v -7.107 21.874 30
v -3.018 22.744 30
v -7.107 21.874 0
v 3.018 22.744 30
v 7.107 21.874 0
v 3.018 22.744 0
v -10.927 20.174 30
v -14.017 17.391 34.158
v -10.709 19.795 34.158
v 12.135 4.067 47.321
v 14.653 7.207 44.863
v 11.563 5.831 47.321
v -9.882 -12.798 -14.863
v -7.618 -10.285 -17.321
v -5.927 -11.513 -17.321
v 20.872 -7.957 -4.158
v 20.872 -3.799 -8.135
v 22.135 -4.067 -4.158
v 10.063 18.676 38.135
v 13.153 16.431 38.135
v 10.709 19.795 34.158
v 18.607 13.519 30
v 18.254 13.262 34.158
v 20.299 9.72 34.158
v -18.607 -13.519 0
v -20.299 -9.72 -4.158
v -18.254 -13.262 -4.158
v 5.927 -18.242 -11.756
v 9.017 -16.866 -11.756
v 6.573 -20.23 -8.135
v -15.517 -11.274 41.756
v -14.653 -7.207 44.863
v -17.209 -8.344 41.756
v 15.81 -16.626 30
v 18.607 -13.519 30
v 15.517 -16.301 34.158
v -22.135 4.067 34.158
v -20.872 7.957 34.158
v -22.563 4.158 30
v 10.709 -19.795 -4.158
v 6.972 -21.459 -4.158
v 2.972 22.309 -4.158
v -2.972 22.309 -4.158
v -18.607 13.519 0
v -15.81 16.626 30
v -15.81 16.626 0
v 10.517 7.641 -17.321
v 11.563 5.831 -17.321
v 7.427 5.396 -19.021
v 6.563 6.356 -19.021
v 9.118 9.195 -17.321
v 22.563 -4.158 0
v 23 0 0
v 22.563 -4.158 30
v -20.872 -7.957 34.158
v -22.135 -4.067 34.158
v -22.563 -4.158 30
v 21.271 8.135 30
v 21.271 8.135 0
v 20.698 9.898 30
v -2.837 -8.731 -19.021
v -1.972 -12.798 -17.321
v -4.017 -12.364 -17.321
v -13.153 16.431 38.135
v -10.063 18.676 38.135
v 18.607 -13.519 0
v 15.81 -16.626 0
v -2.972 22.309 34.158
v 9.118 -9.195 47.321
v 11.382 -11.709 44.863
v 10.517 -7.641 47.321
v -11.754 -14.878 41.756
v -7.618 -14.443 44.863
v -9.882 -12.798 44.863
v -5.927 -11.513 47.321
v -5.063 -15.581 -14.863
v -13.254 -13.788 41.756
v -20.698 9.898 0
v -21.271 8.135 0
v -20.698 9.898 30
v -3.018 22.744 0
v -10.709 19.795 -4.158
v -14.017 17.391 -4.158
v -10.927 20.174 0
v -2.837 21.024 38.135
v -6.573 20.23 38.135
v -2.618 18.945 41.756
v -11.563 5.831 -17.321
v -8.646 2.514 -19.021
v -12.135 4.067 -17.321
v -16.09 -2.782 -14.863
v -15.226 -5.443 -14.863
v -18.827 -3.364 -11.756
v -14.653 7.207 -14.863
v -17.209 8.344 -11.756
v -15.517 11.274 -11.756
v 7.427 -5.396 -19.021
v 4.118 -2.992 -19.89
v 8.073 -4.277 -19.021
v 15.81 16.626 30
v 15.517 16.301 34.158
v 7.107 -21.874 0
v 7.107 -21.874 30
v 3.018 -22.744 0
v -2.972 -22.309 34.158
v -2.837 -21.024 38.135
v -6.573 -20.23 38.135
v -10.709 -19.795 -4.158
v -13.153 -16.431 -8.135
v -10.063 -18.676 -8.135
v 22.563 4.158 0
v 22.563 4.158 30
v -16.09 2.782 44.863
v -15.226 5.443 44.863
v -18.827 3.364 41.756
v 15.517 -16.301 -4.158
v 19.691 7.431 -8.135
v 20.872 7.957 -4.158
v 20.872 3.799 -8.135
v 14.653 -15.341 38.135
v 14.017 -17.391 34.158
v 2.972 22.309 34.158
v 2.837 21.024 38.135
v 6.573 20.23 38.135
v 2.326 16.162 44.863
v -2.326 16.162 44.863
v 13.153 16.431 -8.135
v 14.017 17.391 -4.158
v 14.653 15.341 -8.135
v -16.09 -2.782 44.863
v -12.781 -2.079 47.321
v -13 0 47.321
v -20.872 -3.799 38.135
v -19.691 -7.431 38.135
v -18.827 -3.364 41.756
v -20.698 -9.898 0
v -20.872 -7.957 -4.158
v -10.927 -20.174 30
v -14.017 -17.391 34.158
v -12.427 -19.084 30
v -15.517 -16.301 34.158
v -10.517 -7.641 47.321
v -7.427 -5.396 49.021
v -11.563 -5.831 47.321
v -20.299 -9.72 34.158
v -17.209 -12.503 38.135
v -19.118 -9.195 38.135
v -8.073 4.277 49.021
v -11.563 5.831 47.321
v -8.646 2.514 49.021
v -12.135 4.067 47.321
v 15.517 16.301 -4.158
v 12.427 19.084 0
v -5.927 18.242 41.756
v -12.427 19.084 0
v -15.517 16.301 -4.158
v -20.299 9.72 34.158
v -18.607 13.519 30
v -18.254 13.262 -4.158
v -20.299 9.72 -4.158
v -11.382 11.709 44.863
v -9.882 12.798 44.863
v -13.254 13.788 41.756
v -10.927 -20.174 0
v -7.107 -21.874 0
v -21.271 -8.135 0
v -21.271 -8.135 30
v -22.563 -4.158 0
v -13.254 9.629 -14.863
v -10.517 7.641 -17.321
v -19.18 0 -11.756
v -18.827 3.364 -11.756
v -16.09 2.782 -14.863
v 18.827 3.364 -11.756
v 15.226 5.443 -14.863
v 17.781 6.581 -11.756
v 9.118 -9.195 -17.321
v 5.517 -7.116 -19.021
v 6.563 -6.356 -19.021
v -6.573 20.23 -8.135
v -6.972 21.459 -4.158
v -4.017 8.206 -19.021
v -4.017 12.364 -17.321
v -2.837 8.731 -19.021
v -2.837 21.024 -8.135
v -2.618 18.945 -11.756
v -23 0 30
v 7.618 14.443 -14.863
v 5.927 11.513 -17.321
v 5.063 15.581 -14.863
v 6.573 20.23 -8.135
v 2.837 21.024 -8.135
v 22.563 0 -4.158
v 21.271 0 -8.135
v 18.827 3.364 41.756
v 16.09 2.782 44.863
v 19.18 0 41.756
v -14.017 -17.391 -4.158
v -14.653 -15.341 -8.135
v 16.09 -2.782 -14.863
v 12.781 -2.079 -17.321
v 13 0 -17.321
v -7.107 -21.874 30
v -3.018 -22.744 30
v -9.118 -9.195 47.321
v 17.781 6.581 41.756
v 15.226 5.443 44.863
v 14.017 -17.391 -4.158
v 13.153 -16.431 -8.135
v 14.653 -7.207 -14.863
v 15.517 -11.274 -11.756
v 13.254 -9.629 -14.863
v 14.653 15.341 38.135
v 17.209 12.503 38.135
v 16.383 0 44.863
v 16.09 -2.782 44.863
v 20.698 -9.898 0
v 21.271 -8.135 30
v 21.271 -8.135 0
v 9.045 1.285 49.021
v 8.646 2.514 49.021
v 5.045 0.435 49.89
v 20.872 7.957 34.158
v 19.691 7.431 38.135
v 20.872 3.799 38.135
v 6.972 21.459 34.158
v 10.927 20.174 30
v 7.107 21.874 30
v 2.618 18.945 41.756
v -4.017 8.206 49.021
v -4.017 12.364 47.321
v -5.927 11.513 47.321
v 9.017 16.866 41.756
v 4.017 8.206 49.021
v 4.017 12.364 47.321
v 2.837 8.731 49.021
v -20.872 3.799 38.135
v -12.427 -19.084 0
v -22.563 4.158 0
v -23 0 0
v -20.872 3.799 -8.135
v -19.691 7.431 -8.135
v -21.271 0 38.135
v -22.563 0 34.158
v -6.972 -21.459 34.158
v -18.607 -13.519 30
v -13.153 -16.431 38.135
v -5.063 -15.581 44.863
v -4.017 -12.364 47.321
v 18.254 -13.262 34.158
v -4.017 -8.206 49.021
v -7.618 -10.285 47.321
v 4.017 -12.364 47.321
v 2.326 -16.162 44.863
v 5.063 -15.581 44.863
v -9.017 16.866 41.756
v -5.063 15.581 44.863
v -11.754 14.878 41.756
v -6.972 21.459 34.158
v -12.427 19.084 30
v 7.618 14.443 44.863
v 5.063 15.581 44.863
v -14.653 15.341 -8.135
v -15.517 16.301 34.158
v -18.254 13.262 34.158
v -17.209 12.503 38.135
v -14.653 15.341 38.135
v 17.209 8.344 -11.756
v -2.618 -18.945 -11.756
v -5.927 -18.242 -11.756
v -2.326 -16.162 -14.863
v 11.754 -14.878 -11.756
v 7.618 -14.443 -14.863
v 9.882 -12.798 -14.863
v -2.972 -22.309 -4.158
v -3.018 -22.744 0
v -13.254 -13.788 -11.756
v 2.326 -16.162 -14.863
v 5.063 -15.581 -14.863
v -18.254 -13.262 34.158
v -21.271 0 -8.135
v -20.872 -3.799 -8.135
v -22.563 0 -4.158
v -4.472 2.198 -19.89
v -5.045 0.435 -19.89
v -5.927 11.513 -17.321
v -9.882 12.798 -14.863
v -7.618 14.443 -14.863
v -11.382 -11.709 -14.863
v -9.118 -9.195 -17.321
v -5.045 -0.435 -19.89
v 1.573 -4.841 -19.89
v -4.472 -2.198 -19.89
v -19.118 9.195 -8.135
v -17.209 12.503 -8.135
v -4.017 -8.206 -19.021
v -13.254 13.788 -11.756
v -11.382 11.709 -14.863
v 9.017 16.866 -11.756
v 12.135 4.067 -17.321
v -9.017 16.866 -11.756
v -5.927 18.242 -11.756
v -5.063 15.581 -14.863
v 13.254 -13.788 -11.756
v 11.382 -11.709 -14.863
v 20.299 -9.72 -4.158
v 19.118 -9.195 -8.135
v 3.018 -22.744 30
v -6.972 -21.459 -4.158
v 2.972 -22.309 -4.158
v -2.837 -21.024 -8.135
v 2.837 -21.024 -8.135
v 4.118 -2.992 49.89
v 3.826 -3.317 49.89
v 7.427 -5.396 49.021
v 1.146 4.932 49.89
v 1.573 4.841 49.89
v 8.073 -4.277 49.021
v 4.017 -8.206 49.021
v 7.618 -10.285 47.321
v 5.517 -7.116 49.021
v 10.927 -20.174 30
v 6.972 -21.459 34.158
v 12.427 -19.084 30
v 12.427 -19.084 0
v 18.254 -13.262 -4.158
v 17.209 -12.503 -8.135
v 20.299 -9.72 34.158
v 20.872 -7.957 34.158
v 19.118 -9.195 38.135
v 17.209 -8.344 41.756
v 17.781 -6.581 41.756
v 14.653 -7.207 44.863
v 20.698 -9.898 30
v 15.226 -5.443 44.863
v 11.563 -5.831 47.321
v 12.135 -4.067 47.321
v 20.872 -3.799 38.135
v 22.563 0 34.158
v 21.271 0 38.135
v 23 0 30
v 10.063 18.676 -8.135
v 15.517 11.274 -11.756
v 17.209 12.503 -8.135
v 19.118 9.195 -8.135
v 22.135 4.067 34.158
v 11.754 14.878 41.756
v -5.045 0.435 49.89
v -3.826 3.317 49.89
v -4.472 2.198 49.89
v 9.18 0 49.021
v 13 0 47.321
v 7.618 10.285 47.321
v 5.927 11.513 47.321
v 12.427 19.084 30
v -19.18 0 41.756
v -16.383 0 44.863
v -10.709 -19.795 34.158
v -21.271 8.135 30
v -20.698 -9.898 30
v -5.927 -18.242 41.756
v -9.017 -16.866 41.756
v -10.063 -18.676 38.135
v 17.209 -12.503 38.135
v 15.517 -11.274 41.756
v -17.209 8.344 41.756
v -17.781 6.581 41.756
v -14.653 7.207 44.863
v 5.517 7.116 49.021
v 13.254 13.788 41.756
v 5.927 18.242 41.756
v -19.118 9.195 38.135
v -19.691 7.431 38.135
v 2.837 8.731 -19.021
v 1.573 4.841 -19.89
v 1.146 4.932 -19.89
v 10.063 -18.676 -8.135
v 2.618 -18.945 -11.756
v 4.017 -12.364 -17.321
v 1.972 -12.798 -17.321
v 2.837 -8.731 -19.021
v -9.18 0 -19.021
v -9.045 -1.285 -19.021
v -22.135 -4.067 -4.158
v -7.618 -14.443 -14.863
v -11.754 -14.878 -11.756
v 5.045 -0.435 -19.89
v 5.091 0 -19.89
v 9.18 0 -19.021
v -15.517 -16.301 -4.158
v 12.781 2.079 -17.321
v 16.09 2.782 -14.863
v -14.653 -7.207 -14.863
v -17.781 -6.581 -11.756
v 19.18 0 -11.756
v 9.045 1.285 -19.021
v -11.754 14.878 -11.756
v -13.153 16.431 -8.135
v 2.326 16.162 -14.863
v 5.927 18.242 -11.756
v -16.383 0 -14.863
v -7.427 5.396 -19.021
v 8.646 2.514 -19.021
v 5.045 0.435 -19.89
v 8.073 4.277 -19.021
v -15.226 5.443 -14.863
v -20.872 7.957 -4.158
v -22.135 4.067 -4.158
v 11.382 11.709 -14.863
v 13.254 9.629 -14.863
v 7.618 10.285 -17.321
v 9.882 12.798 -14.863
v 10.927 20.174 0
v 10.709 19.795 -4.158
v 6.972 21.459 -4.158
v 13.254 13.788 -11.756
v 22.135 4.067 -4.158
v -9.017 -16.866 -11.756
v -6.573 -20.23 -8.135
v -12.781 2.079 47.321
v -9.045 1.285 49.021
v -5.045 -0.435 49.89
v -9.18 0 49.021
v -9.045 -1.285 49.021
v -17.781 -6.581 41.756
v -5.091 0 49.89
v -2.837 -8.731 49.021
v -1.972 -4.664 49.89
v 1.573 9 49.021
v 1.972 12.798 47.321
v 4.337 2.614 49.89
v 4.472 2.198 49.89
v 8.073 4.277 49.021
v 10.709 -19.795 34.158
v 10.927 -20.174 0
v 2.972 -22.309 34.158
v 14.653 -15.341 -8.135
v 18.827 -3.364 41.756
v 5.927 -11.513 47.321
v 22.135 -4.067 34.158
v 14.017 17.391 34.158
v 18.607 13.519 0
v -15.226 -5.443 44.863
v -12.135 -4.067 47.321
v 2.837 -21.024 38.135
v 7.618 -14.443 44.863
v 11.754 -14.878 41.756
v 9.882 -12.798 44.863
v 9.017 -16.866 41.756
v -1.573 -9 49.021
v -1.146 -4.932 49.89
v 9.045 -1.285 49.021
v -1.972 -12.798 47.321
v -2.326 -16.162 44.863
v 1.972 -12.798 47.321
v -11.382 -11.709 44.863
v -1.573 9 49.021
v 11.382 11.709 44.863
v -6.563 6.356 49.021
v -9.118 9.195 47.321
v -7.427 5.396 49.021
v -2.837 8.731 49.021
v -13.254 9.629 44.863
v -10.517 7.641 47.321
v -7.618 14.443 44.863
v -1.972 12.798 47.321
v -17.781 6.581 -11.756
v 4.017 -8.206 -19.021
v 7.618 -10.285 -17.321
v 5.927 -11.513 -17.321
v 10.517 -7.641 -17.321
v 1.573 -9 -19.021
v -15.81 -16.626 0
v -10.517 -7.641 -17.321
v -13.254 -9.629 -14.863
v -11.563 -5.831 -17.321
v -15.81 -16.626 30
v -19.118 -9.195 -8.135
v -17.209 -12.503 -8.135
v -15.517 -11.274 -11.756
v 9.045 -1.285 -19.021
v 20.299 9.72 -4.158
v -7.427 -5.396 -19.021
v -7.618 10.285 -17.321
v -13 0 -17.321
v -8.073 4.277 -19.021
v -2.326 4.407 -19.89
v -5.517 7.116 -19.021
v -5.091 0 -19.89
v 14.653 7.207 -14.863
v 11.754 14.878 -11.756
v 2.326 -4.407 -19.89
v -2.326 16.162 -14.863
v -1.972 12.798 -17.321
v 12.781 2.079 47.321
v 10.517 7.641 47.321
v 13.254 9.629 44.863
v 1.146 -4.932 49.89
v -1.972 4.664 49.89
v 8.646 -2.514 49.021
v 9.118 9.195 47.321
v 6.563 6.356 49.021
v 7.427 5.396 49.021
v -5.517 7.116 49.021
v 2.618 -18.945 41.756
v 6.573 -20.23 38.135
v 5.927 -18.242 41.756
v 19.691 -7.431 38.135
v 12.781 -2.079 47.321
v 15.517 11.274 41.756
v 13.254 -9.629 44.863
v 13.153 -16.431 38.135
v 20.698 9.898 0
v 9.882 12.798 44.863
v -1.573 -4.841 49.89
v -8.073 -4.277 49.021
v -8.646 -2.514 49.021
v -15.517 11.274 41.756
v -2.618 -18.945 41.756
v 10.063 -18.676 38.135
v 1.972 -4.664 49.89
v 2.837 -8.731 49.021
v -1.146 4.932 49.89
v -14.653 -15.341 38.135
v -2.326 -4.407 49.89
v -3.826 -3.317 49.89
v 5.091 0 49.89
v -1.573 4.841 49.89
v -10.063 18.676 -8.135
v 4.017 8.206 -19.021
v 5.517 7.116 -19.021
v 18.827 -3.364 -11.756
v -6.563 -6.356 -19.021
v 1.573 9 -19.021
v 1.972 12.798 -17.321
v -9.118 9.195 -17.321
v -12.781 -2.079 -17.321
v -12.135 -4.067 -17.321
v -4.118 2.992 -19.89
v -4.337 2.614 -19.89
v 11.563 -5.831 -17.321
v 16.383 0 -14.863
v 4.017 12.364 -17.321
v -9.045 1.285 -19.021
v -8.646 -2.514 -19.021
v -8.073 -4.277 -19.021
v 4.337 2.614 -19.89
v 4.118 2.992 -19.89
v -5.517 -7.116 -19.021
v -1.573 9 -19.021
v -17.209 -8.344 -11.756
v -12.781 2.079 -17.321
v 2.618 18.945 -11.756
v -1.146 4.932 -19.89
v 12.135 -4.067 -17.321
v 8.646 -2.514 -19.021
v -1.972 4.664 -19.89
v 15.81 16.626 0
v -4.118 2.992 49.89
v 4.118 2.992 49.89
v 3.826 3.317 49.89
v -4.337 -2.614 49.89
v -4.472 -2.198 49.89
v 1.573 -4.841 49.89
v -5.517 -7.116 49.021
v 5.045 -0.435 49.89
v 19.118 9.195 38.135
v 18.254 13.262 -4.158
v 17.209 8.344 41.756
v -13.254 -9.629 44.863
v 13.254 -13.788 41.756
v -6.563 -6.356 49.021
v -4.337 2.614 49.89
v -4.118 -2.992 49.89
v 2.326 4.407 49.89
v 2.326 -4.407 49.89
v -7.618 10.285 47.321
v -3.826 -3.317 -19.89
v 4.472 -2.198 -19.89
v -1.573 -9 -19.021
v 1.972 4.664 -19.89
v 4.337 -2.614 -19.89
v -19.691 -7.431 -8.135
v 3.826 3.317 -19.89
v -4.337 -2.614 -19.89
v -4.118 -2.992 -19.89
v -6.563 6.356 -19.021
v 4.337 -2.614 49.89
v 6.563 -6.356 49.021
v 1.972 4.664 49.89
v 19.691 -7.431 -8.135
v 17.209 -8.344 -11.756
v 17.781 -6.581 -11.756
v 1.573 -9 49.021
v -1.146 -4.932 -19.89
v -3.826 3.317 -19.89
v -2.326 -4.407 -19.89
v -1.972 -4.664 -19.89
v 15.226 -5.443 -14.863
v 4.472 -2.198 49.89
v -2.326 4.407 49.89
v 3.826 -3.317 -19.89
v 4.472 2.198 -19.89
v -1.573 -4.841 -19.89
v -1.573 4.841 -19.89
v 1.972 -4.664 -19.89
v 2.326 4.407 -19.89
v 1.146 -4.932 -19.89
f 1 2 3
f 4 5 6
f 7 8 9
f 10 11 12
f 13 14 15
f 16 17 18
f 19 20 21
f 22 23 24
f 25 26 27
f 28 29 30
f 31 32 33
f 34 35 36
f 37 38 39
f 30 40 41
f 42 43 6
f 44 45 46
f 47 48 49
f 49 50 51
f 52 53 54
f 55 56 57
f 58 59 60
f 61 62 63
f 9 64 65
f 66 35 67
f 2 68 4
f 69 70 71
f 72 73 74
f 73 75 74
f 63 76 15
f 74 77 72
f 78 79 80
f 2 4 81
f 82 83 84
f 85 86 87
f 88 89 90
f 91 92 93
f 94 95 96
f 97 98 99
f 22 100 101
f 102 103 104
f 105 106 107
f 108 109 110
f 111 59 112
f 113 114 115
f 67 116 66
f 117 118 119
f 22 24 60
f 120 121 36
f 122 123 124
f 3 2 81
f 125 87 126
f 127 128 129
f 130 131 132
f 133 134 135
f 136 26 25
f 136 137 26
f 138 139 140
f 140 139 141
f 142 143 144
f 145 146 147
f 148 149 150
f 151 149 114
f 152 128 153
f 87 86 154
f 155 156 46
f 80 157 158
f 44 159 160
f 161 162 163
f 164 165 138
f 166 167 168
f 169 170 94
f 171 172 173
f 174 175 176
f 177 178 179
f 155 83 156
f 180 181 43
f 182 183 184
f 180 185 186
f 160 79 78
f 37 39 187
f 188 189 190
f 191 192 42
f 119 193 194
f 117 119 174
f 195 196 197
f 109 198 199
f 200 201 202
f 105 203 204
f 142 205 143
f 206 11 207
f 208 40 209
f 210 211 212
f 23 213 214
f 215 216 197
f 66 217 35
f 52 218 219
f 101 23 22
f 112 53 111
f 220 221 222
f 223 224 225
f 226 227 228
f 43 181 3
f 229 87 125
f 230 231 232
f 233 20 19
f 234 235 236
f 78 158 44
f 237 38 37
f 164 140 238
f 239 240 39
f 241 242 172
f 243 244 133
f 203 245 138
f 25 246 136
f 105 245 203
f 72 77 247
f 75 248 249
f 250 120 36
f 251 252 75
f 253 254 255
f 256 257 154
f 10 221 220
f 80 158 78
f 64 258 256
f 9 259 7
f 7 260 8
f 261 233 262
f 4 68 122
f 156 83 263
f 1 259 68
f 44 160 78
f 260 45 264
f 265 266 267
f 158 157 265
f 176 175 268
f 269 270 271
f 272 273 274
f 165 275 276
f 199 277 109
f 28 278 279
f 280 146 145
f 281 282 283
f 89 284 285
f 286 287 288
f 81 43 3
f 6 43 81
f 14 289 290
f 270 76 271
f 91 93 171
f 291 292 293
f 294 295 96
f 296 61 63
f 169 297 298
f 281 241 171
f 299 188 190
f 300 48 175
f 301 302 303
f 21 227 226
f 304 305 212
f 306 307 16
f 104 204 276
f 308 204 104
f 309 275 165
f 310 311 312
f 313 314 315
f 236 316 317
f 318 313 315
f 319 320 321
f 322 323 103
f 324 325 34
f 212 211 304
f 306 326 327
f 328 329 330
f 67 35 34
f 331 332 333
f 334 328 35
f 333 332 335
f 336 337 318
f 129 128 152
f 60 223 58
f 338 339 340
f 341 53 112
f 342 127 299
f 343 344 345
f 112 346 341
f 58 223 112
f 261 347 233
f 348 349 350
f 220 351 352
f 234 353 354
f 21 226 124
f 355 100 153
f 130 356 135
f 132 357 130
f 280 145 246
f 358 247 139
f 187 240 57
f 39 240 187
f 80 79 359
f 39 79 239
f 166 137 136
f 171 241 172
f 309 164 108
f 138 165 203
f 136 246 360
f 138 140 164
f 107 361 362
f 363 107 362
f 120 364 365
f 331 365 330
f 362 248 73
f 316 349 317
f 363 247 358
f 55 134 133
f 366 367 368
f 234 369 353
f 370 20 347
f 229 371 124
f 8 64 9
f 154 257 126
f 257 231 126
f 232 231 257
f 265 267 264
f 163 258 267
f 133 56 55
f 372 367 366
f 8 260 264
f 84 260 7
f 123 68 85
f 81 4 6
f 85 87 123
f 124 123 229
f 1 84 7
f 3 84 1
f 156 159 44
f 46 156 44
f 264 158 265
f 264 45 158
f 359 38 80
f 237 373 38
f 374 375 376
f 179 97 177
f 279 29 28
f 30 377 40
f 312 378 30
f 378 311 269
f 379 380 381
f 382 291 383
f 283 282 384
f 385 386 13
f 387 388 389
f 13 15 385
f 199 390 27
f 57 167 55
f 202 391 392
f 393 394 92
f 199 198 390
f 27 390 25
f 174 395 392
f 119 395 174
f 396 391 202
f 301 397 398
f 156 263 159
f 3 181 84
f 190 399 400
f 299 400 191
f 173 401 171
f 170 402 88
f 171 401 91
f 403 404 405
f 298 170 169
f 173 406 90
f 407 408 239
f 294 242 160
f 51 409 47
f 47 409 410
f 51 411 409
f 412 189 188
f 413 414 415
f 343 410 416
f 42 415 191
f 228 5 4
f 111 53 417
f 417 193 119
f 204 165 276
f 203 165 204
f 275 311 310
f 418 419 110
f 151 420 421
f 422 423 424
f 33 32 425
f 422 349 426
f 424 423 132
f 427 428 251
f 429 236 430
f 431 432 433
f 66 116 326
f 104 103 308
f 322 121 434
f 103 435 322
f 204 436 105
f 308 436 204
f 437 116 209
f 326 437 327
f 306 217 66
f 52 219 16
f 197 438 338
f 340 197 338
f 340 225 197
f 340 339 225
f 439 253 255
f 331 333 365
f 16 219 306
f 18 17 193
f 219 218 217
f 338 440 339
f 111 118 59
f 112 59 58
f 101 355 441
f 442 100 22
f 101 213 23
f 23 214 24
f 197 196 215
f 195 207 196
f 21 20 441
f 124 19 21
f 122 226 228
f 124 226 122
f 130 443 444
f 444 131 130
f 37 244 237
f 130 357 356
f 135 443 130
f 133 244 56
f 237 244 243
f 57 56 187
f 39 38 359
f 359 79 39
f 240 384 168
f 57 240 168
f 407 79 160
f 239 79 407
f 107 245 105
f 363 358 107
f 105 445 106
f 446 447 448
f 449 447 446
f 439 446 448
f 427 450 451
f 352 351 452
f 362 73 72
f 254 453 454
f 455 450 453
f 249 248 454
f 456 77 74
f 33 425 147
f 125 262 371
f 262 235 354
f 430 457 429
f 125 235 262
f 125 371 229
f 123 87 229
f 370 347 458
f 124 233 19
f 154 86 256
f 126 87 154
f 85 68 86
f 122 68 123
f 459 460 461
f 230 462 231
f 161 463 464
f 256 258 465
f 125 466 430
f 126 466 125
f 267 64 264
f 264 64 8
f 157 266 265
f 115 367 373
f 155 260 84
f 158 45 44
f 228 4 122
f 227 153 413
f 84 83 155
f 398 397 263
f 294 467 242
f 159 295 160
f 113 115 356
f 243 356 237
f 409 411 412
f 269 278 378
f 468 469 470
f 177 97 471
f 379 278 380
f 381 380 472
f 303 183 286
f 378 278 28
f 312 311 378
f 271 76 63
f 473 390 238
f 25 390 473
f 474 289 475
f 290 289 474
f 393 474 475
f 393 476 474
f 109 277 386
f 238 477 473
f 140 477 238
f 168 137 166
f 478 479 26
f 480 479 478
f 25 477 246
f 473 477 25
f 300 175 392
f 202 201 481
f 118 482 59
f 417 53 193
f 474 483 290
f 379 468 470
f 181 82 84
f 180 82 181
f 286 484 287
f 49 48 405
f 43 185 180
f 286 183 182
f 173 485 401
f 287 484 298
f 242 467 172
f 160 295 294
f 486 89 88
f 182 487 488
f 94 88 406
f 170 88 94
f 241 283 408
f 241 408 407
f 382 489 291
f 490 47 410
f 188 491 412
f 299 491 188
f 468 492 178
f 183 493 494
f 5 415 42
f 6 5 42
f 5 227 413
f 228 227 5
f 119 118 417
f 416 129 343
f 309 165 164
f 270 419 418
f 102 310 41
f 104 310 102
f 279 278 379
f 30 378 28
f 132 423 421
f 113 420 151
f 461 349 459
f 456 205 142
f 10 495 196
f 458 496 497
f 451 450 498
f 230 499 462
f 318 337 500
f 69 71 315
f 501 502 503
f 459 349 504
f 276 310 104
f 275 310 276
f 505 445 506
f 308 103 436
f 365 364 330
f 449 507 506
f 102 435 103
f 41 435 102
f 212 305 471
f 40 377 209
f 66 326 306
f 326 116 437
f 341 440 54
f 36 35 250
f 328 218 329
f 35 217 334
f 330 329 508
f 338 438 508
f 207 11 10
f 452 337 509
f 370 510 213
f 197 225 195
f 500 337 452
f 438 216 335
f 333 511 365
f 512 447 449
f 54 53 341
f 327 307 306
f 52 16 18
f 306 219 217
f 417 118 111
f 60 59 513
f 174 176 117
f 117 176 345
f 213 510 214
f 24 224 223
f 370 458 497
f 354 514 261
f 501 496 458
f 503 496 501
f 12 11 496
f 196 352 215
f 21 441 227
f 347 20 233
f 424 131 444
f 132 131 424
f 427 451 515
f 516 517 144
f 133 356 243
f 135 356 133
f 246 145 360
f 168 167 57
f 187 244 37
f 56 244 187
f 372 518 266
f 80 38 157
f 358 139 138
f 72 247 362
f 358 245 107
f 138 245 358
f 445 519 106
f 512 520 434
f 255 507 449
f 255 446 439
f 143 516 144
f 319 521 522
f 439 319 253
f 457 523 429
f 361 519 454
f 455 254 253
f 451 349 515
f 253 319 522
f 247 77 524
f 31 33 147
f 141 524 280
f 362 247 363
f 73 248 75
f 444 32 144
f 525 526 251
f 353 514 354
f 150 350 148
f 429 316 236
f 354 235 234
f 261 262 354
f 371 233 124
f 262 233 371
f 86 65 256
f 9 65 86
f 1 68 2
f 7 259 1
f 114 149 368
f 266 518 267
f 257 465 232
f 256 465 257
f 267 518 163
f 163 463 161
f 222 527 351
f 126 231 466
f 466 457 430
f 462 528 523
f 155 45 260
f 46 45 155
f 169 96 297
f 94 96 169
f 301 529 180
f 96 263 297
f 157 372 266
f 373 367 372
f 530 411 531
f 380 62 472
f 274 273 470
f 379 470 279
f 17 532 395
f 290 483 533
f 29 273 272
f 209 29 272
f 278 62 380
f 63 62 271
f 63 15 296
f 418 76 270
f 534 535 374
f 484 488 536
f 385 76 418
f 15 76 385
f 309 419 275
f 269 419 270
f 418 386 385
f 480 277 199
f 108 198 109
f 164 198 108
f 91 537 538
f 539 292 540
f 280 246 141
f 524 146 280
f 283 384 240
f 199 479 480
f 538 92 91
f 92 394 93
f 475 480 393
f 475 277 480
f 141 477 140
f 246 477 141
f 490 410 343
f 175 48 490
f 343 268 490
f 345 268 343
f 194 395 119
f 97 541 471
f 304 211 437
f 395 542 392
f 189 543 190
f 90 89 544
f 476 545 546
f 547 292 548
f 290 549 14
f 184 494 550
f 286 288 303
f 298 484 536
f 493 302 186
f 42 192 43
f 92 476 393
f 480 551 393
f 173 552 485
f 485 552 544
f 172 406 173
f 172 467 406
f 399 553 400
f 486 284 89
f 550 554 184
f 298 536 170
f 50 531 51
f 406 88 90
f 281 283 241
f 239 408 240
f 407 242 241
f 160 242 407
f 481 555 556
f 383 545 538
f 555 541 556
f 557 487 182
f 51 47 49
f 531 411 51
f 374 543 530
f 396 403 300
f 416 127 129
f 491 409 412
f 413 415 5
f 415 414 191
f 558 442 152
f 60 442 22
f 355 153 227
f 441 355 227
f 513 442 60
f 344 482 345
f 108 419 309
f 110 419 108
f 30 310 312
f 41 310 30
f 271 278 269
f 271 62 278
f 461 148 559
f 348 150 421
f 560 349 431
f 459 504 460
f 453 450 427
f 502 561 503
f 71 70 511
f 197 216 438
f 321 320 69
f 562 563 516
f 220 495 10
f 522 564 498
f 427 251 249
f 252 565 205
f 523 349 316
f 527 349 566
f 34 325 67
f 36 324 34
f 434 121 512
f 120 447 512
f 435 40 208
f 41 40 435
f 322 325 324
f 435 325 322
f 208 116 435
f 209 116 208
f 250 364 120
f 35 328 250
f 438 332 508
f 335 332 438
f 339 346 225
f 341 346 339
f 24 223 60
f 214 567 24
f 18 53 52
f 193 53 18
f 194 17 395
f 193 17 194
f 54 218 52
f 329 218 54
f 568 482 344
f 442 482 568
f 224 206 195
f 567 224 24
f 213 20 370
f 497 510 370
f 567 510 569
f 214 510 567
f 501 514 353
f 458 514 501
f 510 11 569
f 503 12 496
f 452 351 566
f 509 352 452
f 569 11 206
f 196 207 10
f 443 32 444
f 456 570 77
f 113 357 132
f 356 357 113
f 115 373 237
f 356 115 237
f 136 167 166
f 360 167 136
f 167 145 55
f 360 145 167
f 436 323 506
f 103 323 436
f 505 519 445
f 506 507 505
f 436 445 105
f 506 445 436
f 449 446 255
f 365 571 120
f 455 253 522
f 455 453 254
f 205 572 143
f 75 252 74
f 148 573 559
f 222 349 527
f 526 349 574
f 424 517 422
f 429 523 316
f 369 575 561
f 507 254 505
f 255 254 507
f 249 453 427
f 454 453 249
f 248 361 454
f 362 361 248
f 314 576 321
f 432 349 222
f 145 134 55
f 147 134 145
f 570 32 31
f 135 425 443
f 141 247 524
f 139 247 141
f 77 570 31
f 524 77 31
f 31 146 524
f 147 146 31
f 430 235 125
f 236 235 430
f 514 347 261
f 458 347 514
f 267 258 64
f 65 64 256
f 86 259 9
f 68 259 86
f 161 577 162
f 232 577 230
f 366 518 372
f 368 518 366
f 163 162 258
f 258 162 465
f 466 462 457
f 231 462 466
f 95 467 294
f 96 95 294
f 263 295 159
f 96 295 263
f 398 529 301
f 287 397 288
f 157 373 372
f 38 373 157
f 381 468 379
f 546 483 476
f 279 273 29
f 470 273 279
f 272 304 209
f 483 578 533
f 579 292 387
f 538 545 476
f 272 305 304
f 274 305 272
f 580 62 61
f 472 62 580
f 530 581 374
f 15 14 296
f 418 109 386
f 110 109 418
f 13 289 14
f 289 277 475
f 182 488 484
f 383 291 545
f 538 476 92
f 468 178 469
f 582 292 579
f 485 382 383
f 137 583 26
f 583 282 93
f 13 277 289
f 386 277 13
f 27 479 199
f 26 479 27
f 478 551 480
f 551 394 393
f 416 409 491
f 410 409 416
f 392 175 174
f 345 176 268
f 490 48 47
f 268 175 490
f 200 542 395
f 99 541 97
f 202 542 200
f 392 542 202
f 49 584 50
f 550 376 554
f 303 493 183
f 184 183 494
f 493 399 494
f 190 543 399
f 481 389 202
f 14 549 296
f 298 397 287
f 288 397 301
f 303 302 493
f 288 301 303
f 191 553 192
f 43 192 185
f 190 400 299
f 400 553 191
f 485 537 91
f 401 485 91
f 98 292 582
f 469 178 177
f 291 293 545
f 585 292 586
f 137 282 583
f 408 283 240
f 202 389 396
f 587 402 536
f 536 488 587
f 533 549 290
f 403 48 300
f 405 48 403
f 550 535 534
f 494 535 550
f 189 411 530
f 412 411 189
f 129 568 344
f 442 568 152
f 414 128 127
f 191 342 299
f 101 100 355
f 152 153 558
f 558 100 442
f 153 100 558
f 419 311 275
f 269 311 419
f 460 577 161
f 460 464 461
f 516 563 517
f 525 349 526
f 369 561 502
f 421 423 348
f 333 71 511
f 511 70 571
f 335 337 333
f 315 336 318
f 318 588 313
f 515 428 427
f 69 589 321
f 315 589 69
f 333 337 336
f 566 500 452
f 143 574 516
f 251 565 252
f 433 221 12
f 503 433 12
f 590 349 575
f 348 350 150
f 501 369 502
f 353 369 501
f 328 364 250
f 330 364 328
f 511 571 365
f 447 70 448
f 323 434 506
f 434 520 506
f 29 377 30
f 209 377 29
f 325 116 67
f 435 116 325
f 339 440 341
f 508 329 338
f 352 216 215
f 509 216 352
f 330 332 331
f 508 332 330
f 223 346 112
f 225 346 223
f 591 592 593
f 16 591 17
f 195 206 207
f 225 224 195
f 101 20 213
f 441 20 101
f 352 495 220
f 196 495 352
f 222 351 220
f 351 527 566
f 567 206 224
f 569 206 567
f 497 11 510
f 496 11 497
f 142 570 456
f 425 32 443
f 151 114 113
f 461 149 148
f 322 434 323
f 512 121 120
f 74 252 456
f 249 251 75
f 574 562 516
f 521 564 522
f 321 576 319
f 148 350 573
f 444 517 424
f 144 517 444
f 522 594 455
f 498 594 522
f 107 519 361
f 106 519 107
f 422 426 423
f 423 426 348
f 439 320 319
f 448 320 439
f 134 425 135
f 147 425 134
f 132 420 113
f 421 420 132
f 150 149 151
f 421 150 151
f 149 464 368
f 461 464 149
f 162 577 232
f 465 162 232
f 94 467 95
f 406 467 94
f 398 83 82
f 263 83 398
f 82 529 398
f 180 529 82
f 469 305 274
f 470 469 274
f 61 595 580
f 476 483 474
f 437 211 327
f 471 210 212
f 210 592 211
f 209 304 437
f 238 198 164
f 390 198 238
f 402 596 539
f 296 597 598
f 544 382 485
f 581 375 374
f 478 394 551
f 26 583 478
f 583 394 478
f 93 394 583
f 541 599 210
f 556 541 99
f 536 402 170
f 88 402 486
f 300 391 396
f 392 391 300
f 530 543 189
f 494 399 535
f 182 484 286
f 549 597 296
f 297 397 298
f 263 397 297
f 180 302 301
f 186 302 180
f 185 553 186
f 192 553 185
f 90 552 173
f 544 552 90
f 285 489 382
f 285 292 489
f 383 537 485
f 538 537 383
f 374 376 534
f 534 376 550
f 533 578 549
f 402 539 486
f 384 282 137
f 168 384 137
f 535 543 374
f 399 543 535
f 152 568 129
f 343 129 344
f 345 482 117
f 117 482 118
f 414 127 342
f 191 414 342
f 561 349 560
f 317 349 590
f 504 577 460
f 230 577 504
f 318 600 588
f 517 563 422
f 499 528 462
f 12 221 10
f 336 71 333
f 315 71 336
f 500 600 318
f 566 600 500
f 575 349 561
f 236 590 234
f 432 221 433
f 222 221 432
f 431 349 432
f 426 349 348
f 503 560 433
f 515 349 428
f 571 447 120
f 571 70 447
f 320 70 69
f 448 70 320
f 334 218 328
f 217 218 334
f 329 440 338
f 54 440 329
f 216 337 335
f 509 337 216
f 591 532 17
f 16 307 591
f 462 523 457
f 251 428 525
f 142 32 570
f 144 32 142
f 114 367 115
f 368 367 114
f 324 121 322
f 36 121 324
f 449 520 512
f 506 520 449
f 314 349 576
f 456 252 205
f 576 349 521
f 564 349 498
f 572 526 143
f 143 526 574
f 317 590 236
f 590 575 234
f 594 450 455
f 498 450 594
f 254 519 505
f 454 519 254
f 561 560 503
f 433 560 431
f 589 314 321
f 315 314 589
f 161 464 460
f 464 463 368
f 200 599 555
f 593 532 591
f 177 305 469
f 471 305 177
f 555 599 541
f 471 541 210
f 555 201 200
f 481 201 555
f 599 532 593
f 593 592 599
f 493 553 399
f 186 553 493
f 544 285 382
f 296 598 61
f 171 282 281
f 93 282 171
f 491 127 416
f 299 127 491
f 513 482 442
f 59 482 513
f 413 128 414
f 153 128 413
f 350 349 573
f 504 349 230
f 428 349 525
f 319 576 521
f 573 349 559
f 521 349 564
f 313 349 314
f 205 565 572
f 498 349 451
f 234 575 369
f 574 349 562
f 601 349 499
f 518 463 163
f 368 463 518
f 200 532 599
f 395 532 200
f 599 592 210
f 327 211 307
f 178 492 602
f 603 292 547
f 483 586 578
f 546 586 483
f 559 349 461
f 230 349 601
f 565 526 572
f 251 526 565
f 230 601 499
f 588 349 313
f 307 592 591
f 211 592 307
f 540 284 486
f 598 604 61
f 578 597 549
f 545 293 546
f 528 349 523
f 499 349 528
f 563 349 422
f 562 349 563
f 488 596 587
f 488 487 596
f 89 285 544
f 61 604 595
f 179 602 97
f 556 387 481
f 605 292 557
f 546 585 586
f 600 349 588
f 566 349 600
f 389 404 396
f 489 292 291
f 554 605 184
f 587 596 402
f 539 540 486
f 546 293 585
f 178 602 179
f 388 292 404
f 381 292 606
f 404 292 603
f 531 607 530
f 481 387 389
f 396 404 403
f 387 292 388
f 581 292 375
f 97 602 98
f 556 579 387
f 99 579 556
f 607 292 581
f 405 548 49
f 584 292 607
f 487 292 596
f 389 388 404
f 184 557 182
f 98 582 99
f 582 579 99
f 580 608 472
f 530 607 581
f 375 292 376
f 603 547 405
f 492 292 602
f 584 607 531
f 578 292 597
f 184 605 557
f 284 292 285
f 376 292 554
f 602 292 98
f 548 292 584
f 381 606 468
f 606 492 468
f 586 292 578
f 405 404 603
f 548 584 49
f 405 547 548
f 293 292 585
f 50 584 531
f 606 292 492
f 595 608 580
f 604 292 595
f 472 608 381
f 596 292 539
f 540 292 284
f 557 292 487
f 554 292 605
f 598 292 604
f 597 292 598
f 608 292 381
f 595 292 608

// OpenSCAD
render()
minkowski(){
    sphere(20);
    cylinder(h=30,r=3);
}
